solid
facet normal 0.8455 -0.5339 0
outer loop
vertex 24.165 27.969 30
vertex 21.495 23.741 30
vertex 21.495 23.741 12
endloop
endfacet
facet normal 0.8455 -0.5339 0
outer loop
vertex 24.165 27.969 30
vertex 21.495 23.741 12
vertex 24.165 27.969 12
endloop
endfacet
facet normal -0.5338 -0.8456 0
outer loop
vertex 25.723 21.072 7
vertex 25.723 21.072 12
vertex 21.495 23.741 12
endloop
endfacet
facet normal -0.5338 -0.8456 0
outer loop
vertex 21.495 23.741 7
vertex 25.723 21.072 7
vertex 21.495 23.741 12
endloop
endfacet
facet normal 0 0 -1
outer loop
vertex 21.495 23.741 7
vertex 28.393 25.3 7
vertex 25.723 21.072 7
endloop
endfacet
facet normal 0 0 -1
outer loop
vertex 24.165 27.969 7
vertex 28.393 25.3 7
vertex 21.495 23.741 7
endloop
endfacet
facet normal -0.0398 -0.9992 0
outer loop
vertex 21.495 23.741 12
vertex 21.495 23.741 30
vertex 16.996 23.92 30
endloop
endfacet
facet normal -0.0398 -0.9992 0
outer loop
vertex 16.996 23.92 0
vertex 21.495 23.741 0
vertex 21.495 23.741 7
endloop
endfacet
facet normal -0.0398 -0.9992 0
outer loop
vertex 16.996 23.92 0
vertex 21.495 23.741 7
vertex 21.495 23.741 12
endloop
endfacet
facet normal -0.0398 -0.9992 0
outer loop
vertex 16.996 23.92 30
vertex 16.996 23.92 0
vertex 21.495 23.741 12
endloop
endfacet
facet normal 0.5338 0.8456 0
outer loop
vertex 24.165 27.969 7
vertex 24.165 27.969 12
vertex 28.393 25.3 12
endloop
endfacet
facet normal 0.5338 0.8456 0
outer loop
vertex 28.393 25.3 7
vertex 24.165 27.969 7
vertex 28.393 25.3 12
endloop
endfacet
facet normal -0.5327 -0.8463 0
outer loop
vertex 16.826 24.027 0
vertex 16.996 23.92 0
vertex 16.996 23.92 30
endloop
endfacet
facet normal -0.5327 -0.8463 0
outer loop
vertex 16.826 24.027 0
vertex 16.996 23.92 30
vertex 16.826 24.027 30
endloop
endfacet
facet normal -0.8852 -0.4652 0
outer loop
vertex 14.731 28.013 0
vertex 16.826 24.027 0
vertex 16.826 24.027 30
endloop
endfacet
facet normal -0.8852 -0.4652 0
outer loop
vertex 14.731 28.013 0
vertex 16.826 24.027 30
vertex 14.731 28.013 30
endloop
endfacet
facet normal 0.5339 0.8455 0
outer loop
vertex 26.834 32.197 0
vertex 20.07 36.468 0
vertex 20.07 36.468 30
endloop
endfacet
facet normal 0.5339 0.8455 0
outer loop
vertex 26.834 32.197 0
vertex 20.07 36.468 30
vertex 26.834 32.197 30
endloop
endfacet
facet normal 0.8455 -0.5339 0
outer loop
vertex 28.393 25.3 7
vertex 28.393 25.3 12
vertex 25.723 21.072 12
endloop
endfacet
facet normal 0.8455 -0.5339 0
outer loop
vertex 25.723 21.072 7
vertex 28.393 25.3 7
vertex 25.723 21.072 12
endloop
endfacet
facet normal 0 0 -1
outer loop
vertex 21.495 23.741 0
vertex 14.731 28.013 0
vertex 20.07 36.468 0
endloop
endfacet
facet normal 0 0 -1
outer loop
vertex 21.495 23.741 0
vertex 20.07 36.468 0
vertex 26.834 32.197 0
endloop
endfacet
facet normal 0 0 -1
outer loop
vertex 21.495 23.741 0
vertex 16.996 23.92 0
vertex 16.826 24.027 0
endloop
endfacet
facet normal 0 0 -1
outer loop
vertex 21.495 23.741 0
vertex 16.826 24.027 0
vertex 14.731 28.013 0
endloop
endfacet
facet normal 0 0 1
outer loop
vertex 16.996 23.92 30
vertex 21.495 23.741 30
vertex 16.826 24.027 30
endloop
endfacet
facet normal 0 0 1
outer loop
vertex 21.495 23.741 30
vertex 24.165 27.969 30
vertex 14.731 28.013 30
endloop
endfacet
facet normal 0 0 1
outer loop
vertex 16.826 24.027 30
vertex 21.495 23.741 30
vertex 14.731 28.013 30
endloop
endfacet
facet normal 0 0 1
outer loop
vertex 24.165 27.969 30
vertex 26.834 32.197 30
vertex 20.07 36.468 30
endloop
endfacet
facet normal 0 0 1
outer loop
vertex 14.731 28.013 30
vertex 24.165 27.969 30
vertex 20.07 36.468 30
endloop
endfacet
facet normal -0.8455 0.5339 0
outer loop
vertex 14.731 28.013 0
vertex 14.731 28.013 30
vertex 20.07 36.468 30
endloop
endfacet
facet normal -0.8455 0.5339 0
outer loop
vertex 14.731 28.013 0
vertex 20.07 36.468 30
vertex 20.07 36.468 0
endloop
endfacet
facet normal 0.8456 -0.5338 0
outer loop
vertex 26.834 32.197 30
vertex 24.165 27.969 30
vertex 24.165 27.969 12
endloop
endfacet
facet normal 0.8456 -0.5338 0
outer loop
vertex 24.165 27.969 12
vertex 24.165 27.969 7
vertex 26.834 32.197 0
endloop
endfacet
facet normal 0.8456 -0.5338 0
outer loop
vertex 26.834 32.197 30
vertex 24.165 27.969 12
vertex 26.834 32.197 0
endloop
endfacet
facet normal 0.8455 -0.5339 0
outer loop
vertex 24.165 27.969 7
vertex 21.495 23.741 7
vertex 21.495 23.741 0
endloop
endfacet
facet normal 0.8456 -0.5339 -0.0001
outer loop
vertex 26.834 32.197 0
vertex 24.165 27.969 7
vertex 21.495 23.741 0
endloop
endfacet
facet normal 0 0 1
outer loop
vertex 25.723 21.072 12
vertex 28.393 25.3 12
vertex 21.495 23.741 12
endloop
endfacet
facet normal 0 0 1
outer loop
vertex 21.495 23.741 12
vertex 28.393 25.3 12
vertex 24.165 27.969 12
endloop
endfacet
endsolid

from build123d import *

# Parameters (mm, degrees)
BOSS_EXTRUDE2_DEPTH = 30
SKETCH3_W           = 8
SKETCH3_H           = 30
BOSS_EXTRUDE3_DEPTH = 10
BOSS_EXTRUDE4_DEPTH = 23
CUT_EXTRUDE1_DEPTH  = 18


with BuildPart() as part:
    # Sketch2 → Boss-Extrude2 (new body)
    with BuildSketch(Plane.XY):
        Polygon((16.826264571, 24.026772498), (14.730988717, 28.012523819), (21.495359976, 23.741308364), (16.995960151, 23.919621906), align=None)
    extrude(amount=BOSS_EXTRUDE2_DEPTH)

    # Sketch3 → Boss-Extrude3 (add)
    with BuildSketch(Plane(origin=(16.845028917, 26.677659006, 0), x_dir=(0.845546407, -0.533901932, 0), z_dir=(0.533901932, 0.845546407, 0))):
        with Locations((1.499794001, -15)):
            Rectangle(SKETCH3_W, SKETCH3_H)
    extrude(amount=BOSS_EXTRUDE3_DEPTH)

    # Sketch5 → Boss-Extrude4 (add)
    with BuildSketch(Plane.XY.offset(30)):
        Polygon((24.164869635, 27.969040401), (28.392601672, 25.299530741), (25.723092013, 21.071798704), (21.495359976, 23.741308364), align=None)
    extrude(amount=-BOSS_EXTRUDE4_DEPTH)

    # Sketch6 → Cut-Extrude1 (cut)
    with BuildSketch(Plane.XY.offset(30)):
        Polygon((21.495359976, 23.741308364), (24.164869635, 27.969040401), (28.392601672, 25.299530741), (25.723092013, 21.071798704), align=None)
    extrude(amount=-CUT_EXTRUDE1_DEPTH, mode=Mode.SUBTRACT)


solid = part.part
